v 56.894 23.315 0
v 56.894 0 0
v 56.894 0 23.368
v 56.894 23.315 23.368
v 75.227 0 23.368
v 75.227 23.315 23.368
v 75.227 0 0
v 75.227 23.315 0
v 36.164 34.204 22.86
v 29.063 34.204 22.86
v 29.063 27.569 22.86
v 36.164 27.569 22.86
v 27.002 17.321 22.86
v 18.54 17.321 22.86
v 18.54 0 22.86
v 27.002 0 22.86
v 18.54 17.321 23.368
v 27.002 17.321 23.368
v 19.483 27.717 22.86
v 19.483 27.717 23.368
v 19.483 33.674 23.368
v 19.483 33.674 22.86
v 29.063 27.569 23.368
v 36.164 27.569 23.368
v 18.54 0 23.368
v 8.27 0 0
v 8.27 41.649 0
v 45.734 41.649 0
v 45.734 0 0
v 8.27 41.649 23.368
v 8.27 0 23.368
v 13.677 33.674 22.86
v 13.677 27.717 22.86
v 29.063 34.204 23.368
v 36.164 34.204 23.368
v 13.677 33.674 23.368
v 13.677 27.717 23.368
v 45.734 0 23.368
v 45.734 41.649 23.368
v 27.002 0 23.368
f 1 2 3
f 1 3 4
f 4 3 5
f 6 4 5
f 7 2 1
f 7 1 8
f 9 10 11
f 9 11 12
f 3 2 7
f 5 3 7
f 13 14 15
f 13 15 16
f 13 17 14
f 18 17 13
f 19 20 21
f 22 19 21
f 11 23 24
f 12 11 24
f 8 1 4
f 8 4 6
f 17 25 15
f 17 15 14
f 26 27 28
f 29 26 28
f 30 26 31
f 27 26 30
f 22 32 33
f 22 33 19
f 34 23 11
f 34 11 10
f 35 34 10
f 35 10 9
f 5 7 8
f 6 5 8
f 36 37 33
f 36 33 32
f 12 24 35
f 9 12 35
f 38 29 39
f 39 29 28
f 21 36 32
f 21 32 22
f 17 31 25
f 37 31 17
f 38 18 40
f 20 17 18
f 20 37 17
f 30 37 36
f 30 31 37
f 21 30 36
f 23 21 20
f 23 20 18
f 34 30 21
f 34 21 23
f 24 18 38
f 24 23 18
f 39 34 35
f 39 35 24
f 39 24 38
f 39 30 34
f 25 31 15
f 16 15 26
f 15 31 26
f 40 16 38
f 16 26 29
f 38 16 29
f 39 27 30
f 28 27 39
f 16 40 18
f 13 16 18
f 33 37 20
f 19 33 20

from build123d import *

# Parameters (mm, degrees)
F0_W     = 37.4642126262
F0_H     = 41.6490398347
F1_DEPTH = 23.368
F0_W_2   = 18.3335468173
F0_H_2   = 23.3154930174
F2_W     = 5.8058956638
F2_H     = 5.9576556087
F2_W_2   = 7.1008522063
F2_H_2   = 6.6343583167
F2_W_3   = 8.4620676935
F2_H_3   = 17.3213407397
F3_DEPTH = 0.508


with BuildPart() as f1:
    # F0 (on Top) → F1 (new body)
    with BuildSketch(Plane.XY):
        with Locations((27.0021278411, 20.8245199174)):
            Rectangle(F0_W, F0_H)
    extrude(amount=F1_DEPTH)

    # F2 (on face) → F3 (cut)
    with BuildSketch(Plane.XY.offset(23.368)):
        with Locations((16.5800447576, 30.6956470013)):
            Rectangle(F2_W, F2_H)
        with Locations((32.6137794182, 30.8863837272)):
            Rectangle(F2_W_2, F2_H_2)
        with Locations((22.7710939944, 8.6606703699)):
            Rectangle(F2_W_3, F2_H_3)
    extrude(amount=-F3_DEPTH, mode=Mode.SUBTRACT)


with BuildPart() as f1b:
    # F0 (on Top) → F1, piece 2 (new body)
    with BuildSketch(Plane.XY):
        with Locations((66.0605579615, 11.6577465087)):
            Rectangle(F0_W_2, F0_H_2)
    extrude(amount=F1_DEPTH)


solid = Compound([f1.part, f1b.part])
